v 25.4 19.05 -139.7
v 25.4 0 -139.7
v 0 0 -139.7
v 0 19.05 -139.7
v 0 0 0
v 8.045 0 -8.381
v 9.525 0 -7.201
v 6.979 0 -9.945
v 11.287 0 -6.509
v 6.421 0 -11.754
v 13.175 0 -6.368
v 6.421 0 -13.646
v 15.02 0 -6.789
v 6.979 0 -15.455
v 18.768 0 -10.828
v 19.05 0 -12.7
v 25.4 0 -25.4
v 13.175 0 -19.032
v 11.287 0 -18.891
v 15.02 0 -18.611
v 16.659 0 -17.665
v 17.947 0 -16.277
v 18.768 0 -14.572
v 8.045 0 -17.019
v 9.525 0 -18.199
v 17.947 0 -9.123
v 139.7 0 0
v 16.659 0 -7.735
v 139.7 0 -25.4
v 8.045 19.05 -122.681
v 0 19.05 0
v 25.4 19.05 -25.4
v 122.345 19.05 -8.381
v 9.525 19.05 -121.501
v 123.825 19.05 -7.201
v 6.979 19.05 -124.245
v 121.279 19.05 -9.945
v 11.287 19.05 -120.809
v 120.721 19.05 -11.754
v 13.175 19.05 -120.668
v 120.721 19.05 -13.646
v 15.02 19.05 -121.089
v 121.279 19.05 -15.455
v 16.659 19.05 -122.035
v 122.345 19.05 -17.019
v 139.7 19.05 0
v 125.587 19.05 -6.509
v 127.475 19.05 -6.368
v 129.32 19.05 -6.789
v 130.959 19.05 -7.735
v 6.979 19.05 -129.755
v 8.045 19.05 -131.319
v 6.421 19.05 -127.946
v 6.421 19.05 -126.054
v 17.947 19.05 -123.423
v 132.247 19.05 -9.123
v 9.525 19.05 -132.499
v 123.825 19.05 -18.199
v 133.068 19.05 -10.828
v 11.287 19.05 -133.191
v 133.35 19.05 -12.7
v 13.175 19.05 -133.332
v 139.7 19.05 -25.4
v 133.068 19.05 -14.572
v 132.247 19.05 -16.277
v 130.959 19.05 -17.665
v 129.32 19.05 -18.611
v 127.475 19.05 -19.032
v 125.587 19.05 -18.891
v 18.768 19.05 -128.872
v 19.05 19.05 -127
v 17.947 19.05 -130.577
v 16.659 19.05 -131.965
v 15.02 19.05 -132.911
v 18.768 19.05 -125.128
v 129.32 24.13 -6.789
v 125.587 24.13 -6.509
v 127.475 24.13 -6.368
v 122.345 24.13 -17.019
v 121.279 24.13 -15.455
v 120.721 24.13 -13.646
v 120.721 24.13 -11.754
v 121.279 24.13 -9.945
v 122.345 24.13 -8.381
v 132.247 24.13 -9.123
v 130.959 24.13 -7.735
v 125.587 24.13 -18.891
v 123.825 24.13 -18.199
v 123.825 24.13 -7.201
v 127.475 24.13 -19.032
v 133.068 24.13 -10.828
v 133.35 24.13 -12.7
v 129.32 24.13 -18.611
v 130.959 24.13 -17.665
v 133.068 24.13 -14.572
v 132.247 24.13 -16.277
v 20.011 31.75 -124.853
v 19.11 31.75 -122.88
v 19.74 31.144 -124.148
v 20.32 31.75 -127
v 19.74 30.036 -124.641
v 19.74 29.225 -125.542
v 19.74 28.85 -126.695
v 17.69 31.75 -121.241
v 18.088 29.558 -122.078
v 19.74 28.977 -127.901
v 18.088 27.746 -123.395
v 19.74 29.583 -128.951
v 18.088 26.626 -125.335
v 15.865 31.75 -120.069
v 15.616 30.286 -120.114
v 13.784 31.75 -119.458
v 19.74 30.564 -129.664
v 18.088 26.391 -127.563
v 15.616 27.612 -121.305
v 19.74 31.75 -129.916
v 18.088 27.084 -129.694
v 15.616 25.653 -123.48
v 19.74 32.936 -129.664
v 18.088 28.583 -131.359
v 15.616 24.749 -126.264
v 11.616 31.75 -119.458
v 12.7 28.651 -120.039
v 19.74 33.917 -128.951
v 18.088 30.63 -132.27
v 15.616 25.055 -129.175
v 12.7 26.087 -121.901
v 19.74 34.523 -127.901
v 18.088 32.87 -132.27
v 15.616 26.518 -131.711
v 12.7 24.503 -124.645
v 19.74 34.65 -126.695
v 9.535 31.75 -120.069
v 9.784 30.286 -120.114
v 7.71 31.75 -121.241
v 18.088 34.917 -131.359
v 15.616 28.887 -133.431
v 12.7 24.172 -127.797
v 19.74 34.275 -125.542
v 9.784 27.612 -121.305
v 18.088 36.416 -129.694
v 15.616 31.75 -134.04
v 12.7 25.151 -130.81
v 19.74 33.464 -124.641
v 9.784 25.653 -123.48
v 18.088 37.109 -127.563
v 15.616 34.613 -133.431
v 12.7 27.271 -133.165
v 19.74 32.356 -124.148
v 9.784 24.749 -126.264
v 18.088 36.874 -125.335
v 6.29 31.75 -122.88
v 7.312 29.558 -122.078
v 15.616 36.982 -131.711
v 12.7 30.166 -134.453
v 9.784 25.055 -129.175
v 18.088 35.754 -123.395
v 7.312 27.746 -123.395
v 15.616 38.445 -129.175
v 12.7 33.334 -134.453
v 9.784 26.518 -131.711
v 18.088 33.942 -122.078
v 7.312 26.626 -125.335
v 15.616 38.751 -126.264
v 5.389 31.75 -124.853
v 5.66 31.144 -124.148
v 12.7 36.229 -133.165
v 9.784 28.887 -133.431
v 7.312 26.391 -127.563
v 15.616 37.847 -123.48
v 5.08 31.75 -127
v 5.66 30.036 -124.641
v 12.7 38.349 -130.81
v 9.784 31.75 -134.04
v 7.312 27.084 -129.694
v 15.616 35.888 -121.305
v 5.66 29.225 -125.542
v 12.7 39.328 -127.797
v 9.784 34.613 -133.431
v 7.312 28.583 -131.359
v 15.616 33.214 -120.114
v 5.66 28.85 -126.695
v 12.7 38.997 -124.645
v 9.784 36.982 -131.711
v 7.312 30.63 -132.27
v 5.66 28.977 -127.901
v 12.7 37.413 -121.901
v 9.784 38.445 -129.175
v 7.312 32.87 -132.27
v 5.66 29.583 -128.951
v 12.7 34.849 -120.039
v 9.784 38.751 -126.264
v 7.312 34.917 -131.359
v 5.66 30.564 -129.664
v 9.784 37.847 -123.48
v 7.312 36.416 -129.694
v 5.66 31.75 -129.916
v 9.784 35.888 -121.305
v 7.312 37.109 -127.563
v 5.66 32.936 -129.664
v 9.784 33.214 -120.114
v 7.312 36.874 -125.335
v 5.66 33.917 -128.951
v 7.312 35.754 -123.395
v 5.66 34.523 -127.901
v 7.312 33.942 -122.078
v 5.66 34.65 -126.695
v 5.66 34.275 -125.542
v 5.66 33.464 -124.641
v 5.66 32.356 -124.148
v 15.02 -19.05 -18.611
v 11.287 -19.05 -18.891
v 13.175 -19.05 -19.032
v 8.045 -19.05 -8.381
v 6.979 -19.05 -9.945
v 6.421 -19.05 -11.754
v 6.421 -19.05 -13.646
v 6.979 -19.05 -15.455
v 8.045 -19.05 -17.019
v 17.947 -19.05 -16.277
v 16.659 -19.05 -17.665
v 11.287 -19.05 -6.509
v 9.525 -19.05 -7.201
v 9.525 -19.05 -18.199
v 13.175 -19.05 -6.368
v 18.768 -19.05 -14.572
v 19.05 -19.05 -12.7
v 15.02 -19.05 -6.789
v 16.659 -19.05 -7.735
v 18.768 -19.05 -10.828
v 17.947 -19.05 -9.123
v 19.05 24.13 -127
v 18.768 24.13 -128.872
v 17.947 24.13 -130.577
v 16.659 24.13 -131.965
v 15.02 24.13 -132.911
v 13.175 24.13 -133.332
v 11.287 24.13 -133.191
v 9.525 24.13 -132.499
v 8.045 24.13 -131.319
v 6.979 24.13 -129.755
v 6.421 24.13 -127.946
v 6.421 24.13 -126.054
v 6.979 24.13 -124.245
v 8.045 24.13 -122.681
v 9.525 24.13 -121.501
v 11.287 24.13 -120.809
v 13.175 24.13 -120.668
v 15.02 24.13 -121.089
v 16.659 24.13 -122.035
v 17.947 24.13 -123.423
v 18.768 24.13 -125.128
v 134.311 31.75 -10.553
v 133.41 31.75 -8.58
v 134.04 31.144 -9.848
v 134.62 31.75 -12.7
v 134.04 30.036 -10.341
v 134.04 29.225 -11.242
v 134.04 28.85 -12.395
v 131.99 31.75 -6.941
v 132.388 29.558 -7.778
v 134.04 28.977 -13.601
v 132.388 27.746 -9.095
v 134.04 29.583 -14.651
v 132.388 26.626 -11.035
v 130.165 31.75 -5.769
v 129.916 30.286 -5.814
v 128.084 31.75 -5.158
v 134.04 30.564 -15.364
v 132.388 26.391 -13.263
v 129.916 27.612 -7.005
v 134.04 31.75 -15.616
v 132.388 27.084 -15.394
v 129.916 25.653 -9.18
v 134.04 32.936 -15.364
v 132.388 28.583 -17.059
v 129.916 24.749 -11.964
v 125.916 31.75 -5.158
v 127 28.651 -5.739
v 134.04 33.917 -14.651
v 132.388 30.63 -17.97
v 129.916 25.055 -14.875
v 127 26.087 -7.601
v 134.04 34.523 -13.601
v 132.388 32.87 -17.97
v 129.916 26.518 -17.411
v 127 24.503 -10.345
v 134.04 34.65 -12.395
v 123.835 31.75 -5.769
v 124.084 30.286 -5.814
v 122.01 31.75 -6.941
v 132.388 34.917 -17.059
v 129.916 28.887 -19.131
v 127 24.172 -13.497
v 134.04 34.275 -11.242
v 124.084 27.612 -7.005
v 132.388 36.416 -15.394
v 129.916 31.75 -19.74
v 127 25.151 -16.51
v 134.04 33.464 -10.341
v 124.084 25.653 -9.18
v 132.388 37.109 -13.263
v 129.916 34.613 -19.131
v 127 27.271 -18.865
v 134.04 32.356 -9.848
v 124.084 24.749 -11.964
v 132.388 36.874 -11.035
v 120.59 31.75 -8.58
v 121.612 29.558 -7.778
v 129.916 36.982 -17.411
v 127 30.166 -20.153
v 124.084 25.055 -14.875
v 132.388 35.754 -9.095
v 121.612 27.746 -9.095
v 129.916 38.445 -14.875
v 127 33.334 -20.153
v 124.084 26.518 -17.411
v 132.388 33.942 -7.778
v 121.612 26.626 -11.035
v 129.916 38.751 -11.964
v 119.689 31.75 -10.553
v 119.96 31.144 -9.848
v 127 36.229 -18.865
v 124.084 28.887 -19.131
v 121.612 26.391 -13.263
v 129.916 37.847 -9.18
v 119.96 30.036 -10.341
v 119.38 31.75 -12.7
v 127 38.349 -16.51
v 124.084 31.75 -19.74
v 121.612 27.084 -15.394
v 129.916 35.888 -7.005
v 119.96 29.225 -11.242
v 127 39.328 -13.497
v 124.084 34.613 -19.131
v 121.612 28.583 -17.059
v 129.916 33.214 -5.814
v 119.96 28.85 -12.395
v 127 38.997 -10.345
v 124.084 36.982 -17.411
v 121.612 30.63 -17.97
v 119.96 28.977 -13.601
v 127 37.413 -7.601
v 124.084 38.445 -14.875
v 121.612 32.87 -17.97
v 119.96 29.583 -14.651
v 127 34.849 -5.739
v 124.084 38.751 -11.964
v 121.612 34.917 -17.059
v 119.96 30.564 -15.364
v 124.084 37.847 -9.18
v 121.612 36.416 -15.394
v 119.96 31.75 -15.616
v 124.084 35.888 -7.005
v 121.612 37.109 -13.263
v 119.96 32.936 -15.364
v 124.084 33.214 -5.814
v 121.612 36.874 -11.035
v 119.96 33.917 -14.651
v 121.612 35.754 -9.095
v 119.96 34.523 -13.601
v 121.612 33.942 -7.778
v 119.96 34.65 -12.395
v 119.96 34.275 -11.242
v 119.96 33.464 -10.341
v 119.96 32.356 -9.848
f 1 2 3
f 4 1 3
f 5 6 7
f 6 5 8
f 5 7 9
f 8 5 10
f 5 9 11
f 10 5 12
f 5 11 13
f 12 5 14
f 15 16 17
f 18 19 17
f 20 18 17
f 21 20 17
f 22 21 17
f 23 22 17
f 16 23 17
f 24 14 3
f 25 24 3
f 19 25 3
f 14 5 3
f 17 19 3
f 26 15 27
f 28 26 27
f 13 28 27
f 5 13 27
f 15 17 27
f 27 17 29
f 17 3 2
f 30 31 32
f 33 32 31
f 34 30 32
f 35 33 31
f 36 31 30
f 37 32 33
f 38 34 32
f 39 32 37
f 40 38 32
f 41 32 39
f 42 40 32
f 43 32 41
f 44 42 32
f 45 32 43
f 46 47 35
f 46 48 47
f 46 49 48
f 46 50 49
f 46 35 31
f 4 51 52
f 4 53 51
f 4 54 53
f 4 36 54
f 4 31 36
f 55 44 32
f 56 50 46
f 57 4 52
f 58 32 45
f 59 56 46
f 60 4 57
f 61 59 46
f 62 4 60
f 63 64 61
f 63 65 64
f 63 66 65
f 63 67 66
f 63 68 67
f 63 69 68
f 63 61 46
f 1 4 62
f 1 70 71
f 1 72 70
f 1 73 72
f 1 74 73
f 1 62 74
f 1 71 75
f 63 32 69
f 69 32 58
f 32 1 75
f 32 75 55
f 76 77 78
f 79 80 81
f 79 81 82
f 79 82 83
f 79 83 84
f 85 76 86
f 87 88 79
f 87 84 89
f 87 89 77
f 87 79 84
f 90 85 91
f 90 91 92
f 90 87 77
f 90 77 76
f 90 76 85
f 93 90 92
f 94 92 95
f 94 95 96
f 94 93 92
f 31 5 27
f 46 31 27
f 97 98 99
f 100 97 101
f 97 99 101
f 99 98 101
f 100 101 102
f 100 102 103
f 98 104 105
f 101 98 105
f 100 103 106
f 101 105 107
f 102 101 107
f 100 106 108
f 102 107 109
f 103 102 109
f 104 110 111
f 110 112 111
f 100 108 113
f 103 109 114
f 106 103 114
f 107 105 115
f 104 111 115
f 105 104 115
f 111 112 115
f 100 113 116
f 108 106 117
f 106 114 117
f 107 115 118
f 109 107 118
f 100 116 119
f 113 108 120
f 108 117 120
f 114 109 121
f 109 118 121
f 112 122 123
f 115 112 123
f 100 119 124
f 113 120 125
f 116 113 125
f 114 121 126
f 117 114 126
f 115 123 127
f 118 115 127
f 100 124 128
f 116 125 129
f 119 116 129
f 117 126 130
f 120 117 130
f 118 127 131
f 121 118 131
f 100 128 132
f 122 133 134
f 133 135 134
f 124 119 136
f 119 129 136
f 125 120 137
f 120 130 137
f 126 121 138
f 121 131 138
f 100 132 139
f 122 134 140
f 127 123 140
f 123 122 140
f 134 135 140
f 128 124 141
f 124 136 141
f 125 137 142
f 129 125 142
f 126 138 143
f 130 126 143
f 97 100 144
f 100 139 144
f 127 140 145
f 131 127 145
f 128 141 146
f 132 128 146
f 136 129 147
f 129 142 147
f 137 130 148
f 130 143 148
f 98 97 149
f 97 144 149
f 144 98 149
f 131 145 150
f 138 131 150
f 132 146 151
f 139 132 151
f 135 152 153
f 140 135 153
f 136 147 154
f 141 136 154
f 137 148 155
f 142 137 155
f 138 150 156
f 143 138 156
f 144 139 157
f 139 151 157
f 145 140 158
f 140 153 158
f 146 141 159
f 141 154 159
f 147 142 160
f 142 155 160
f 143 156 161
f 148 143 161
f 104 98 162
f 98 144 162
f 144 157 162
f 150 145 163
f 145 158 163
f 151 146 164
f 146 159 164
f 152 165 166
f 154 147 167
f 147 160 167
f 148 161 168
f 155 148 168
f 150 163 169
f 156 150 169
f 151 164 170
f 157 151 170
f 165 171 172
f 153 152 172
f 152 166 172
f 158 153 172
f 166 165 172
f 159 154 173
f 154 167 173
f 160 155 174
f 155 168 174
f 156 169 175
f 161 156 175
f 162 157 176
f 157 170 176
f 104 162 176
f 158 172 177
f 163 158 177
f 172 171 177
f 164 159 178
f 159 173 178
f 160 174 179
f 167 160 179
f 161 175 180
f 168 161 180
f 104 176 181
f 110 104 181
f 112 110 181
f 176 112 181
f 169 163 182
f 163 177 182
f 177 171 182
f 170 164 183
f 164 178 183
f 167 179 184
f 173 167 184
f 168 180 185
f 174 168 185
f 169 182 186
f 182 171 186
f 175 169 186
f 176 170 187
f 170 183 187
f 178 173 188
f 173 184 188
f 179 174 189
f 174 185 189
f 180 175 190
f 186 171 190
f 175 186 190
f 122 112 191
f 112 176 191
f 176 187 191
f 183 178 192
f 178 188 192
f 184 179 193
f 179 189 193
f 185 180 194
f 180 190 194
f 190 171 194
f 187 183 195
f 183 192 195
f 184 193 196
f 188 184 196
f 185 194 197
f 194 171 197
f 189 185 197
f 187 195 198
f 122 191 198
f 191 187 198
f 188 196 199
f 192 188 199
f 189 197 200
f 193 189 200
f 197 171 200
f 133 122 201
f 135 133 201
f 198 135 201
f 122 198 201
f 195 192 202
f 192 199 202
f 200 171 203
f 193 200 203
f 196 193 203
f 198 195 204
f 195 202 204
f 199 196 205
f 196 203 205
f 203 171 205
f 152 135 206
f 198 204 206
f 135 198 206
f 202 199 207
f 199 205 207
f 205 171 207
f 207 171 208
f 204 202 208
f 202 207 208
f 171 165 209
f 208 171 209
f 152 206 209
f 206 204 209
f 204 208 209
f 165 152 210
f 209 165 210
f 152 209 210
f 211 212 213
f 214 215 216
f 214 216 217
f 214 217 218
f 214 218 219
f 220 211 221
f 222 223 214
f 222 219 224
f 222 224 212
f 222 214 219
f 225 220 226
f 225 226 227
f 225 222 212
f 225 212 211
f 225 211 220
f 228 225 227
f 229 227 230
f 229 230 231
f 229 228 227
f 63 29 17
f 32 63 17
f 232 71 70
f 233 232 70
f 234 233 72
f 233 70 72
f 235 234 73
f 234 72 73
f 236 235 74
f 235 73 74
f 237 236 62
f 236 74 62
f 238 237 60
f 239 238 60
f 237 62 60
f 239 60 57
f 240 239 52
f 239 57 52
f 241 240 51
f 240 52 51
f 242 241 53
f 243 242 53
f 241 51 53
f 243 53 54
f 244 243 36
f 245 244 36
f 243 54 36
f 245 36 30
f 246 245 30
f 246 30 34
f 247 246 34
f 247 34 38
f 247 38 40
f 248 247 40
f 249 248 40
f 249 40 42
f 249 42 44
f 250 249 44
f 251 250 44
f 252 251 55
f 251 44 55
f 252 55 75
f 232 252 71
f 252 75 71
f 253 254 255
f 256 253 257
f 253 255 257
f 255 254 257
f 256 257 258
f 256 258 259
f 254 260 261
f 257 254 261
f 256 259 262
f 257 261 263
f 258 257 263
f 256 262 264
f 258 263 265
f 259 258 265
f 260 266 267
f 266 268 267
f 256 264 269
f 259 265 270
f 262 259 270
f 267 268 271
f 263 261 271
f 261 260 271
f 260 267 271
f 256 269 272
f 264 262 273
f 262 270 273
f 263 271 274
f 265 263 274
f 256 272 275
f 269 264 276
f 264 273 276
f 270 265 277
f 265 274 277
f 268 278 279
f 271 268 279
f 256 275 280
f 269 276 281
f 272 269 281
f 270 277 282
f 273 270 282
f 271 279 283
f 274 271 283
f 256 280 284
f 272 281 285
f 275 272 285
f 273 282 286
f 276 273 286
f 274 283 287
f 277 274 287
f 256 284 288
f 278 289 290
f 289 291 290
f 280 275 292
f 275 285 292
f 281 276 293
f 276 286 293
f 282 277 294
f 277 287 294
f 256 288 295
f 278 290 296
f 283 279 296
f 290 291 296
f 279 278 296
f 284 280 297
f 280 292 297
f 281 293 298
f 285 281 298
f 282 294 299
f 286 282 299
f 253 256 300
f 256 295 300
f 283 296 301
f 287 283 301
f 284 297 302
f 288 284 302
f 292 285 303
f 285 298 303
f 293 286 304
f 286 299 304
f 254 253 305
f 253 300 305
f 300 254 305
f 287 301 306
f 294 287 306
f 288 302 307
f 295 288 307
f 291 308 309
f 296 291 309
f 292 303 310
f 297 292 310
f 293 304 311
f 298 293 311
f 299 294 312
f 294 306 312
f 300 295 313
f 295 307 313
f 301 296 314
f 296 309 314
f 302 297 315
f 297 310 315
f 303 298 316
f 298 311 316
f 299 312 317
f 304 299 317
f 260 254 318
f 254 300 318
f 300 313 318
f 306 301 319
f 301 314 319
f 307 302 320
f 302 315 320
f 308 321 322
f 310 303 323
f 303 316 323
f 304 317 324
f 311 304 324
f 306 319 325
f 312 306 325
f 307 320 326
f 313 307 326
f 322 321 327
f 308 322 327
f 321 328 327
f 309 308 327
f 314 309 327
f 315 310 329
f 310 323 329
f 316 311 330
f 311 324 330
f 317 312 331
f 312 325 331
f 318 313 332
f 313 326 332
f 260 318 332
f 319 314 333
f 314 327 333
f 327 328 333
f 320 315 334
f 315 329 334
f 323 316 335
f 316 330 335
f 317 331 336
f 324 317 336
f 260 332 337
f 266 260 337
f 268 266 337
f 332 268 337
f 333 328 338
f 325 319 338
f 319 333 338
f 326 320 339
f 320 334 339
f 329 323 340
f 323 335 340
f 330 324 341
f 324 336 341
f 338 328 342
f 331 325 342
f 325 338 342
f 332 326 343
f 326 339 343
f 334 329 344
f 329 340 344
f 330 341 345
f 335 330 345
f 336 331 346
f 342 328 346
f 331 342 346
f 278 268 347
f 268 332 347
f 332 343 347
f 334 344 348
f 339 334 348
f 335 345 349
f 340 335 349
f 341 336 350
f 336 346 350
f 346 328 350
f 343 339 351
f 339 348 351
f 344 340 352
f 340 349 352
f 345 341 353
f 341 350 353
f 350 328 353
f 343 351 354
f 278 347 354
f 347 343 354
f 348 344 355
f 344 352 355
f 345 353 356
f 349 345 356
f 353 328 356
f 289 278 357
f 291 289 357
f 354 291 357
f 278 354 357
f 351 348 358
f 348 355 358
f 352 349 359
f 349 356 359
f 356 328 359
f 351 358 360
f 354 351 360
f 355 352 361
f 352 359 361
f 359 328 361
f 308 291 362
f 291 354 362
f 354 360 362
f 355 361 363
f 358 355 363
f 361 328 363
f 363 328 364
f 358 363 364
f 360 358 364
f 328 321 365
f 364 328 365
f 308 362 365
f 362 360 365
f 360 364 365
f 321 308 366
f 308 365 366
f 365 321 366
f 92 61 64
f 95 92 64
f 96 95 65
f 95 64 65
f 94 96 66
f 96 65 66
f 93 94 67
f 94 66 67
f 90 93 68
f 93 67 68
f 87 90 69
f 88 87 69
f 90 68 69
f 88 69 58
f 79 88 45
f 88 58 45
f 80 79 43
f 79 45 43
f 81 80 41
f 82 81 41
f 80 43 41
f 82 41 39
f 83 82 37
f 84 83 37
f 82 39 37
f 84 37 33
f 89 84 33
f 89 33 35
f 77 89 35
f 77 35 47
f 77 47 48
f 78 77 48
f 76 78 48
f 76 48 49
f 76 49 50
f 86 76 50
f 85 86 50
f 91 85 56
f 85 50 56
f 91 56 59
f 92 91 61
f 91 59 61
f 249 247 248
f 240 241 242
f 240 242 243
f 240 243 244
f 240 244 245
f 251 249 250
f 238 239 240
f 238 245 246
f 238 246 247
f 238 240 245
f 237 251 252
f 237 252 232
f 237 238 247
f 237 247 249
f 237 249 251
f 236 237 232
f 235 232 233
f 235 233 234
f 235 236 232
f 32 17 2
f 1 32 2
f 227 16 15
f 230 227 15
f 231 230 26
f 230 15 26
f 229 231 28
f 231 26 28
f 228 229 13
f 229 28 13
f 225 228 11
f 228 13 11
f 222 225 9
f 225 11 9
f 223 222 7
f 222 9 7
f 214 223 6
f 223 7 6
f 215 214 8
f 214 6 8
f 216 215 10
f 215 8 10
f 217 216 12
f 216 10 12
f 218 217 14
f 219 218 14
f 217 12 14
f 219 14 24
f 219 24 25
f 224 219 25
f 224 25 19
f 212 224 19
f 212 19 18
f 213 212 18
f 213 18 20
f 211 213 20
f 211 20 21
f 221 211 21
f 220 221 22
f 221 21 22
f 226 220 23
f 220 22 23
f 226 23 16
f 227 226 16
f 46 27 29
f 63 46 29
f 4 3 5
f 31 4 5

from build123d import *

# Parameters (mm, degrees)
BOSS_EXTRUDE1_DEPTH = 19.05
SKETCH3_R           = 6.35
BOSS_EXTRUDE2_DEPTH = 5.08
SKETCH4_R           = 6.35
BOSS_EXTRUDE3_DEPTH = 19.05


with BuildPart() as part:
    # Sketch2 → Boss-Extrude1 (new body)
    with BuildSketch(Plane(origin=(0, 0, 0), x_dir=(1, 0, 0), z_dir=(0, 1, 0))):
        Polygon((0, 139.7), (0, 0), (139.7, 0), (139.7, 25.4), (25.4, 25.4), (25.4, 139.7), align=None)
    extrude(amount=BOSS_EXTRUDE1_DEPTH)

    # Sketch3 → Boss-Extrude2 (add)
    with BuildSketch(Plane(origin=(0, 19.05, 0), x_dir=(1, 0, 0), z_dir=(0, 1, 0))):
        with Locations((127, 12.7)):
            Circle(SKETCH3_R)
        with Locations((12.7, 127)):
            Circle(SKETCH3_R)
    extrude(amount=BOSS_EXTRUDE2_DEPTH)

    # Sketch4 → Boss-Extrude3 (add)
    with BuildSketch(Plane.XZ):
        with Locations((12.7, -12.7)):
            Circle(SKETCH4_R)
    extrude(amount=BOSS_EXTRUDE3_DEPTH)


with BuildPart() as body_2:
    # Sketch5 → Revolve1 (revolve)
    with BuildSketch(Plane(origin=(0, 31.75, 0), x_dir=(1, 0, 0), z_dir=(0, 1, 0))):
        with BuildLine():
            Line((5.08, 127), (20.32, 127))
            ThreePointArc((20.32, 127), (12.7, 119.38), (5.08, 127))
        make_face()
    revolve(axis=Axis((5.08, 31.75, -127), (1, 0, 0)))


with BuildPart() as body_3:
    # Sketch6 → Revolve2 (revolve)
    with BuildSketch(Plane(origin=(0, 31.75, 0), x_dir=(1, 0, 0), z_dir=(0, 1, 0))):
        with BuildLine():
            Line((119.38, 12.7), (134.62, 12.7))
            ThreePointArc((134.62, 12.7), (127, 5.08), (119.38, 12.7))
        make_face()
    revolve(axis=Axis((119.38, 31.75, -12.7), (1, 0, 0)))


solid = Compound([part.part, body_2.part, body_3.part])
